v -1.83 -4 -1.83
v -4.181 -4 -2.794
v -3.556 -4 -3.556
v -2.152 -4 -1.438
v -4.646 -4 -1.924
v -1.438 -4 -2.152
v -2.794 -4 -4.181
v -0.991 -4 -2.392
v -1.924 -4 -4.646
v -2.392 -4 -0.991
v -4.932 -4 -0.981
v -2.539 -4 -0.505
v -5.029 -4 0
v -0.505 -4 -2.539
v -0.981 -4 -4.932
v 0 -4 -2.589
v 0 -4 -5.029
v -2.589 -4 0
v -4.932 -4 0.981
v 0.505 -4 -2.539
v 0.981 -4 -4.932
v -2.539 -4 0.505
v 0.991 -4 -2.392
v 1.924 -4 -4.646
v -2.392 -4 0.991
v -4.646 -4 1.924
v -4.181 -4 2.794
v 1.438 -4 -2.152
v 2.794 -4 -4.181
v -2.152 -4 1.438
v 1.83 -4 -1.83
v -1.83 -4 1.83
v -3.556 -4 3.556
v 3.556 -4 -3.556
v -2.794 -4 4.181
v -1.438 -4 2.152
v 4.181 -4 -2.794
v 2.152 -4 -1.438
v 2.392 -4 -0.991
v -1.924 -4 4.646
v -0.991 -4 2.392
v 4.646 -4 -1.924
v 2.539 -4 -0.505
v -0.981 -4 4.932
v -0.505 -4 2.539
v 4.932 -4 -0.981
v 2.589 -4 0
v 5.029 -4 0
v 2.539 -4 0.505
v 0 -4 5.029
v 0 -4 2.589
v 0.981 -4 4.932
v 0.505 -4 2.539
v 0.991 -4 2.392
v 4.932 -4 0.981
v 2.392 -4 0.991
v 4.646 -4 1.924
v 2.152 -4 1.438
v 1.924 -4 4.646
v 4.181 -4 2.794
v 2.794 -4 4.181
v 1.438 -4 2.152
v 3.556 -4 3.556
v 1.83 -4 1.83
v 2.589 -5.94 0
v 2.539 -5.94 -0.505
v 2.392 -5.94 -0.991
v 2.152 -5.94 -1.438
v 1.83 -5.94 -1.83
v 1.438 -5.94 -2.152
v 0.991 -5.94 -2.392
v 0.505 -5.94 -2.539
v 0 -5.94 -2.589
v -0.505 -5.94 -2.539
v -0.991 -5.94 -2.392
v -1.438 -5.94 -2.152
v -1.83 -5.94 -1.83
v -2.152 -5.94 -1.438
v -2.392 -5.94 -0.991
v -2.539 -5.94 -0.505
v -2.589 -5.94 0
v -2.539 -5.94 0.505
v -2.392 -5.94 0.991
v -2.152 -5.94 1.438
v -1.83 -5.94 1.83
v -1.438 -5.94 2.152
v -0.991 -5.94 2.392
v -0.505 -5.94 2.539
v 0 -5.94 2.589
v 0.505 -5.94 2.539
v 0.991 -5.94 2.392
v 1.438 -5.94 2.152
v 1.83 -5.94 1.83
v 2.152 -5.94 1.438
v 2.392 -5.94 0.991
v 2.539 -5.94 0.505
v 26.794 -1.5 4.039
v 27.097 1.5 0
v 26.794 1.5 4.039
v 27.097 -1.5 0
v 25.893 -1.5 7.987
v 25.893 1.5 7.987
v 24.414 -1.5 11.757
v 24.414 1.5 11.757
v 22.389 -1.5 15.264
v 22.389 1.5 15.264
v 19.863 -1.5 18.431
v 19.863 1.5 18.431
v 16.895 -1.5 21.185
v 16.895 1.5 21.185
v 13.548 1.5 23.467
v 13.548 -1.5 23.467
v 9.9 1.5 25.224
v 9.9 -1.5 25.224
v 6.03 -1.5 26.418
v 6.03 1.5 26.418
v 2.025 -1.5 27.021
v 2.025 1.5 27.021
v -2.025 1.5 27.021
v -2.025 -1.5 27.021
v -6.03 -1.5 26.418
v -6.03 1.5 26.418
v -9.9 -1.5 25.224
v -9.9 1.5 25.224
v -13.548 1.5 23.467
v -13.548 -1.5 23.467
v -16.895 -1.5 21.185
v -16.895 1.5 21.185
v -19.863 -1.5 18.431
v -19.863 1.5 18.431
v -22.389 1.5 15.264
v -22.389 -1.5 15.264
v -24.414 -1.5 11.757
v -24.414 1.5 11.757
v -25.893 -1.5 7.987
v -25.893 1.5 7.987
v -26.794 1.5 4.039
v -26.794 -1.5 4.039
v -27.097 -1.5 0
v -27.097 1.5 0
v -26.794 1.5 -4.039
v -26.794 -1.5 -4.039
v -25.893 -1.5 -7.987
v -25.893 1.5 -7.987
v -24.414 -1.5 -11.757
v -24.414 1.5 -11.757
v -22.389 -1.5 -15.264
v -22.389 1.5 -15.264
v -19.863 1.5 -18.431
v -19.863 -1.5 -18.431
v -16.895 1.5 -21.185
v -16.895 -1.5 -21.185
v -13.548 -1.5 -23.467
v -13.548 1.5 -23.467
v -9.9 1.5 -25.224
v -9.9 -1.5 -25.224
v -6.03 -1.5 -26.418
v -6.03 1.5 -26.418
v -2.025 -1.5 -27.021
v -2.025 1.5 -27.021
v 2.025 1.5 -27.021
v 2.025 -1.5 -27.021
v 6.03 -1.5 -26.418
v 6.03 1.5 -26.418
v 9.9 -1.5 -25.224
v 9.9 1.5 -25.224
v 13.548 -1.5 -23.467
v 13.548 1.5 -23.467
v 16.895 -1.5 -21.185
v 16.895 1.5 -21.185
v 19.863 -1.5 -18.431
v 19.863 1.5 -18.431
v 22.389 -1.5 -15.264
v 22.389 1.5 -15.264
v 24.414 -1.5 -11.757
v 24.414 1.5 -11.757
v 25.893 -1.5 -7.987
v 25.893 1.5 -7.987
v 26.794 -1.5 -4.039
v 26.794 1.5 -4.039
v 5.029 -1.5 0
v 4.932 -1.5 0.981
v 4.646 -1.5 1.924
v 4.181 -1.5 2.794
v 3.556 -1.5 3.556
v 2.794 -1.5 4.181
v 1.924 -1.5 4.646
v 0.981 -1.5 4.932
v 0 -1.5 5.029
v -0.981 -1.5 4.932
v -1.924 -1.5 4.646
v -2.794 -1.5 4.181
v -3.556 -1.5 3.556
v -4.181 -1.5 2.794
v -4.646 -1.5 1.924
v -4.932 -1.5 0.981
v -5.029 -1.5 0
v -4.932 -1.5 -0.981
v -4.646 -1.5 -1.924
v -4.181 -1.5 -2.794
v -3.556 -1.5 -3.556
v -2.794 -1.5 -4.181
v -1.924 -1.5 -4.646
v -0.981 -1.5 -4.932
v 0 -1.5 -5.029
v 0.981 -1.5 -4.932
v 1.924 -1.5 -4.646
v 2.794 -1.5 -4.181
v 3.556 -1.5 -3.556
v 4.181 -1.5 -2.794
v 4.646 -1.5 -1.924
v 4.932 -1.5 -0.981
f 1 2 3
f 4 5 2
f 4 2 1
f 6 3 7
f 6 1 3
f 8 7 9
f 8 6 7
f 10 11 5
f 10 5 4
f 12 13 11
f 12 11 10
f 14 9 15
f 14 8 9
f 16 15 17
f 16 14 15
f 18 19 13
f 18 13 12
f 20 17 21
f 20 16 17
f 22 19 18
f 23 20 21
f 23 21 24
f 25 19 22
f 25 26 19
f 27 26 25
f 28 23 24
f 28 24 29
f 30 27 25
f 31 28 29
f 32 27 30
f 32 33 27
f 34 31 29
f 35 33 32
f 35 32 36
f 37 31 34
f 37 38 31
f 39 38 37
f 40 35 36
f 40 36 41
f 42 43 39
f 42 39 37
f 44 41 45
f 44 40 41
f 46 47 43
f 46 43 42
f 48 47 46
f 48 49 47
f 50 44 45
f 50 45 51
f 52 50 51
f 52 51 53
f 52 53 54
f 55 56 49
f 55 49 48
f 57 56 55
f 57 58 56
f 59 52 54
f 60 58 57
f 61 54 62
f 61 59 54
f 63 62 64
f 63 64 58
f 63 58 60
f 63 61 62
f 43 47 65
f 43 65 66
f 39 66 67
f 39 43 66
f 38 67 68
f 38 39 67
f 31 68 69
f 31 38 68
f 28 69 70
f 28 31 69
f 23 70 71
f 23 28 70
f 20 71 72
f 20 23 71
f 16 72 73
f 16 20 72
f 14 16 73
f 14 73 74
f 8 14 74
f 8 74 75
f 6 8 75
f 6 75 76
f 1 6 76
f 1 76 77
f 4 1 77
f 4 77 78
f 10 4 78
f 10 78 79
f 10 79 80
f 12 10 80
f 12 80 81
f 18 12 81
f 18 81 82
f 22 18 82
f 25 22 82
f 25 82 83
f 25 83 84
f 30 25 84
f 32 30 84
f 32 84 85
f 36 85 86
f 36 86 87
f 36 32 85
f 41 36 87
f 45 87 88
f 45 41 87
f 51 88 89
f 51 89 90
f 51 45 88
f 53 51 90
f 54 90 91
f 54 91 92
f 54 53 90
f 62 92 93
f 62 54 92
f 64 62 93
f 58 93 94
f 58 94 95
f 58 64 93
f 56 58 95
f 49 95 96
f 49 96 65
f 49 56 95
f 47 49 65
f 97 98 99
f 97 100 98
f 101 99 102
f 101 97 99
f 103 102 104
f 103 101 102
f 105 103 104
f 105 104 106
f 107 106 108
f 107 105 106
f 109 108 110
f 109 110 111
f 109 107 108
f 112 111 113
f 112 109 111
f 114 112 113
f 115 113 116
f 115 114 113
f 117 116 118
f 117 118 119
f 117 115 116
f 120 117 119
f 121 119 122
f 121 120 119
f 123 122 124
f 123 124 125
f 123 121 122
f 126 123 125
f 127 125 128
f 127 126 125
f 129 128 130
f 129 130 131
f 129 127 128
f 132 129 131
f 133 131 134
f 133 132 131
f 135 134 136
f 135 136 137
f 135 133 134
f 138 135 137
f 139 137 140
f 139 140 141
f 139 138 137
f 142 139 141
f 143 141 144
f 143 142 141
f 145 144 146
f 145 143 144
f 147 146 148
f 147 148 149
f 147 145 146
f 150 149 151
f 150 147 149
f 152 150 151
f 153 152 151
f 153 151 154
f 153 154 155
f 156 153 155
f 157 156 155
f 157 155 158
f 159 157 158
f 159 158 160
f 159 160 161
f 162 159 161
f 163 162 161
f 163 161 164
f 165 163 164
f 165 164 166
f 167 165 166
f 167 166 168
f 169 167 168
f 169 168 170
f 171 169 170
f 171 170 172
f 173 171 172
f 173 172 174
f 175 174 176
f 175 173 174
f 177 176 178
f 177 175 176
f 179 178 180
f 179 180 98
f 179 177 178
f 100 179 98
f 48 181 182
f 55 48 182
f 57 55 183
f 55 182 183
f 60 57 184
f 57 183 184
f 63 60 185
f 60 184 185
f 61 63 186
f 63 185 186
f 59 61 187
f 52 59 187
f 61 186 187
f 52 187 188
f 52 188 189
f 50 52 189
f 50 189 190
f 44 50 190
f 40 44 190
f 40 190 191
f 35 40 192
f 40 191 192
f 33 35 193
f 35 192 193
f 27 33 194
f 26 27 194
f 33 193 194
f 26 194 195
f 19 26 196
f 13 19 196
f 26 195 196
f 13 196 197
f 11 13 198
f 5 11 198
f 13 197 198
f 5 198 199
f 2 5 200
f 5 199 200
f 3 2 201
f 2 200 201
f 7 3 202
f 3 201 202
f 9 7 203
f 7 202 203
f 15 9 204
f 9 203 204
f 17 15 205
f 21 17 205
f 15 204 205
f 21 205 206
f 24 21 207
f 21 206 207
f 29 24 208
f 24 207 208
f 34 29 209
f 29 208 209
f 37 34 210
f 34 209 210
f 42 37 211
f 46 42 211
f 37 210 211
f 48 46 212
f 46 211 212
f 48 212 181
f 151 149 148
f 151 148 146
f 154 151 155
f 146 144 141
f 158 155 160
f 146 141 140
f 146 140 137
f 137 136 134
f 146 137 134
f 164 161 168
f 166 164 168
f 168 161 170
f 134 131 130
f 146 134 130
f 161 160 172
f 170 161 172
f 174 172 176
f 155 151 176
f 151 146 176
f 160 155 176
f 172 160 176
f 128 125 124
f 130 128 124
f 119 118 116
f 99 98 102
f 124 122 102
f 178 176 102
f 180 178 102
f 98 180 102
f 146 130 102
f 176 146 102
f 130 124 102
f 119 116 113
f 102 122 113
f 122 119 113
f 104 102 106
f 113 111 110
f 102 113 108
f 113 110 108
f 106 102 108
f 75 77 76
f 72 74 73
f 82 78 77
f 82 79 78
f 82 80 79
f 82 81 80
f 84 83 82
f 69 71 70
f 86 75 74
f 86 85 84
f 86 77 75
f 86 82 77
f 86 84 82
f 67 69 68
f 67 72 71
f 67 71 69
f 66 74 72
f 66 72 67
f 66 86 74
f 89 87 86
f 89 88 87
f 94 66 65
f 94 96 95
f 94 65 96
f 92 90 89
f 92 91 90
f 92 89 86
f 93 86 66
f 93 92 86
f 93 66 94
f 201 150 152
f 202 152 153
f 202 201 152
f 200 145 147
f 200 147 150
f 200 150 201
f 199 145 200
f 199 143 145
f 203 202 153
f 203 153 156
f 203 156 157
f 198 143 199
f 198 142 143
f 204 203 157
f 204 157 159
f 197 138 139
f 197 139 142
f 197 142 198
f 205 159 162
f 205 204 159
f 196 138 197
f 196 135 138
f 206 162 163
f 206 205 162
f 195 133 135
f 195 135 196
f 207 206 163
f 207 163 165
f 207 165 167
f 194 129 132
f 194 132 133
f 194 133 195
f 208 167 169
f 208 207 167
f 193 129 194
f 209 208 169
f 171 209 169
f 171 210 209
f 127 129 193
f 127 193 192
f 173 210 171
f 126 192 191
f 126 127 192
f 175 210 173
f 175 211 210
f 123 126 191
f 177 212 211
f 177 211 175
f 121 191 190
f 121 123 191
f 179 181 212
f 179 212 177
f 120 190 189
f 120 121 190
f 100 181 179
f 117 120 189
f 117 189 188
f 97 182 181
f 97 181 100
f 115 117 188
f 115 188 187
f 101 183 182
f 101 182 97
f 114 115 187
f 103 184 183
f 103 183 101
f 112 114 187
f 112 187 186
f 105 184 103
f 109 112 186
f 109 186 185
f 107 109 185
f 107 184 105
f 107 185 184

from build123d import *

# Parameters (mm, degrees)
F0_R     = 27.0969905712
F1_DEPTH = 1.5
F2_R     = 5.028682338
F3_DEPTH = 2.5
F4_T     = -2.44
F5_DEPTH = 5


with BuildPart() as f1:
    # F0 (on Front) → F1 (new body, symmetric)
    with BuildSketch(Plane.XZ):
        Circle(F0_R)
    extrude(amount=F1_DEPTH, both=True)

    # F2 (on face) → F3 (join)
    with BuildSketch(Plane.XZ.offset(1.5)):
        Circle(F2_R)
    extrude(amount=F3_DEPTH)

    # F4
    f4_openings = [f1.faces().sort_by_distance(p)[0] for p in [
        (0, -4, 0),
    ]]
    offset(amount=F4_T, openings=f4_openings, kind=Kind.INTERSECTION)

    # F5 (add): a face of the model
    f5_faces = [f1.faces().sort_by_distance(p)[0] for p in [
        (0, -0.94, 0),
    ]]
    extrude(f5_faces, amount=F5_DEPTH)


solid = f1.part
